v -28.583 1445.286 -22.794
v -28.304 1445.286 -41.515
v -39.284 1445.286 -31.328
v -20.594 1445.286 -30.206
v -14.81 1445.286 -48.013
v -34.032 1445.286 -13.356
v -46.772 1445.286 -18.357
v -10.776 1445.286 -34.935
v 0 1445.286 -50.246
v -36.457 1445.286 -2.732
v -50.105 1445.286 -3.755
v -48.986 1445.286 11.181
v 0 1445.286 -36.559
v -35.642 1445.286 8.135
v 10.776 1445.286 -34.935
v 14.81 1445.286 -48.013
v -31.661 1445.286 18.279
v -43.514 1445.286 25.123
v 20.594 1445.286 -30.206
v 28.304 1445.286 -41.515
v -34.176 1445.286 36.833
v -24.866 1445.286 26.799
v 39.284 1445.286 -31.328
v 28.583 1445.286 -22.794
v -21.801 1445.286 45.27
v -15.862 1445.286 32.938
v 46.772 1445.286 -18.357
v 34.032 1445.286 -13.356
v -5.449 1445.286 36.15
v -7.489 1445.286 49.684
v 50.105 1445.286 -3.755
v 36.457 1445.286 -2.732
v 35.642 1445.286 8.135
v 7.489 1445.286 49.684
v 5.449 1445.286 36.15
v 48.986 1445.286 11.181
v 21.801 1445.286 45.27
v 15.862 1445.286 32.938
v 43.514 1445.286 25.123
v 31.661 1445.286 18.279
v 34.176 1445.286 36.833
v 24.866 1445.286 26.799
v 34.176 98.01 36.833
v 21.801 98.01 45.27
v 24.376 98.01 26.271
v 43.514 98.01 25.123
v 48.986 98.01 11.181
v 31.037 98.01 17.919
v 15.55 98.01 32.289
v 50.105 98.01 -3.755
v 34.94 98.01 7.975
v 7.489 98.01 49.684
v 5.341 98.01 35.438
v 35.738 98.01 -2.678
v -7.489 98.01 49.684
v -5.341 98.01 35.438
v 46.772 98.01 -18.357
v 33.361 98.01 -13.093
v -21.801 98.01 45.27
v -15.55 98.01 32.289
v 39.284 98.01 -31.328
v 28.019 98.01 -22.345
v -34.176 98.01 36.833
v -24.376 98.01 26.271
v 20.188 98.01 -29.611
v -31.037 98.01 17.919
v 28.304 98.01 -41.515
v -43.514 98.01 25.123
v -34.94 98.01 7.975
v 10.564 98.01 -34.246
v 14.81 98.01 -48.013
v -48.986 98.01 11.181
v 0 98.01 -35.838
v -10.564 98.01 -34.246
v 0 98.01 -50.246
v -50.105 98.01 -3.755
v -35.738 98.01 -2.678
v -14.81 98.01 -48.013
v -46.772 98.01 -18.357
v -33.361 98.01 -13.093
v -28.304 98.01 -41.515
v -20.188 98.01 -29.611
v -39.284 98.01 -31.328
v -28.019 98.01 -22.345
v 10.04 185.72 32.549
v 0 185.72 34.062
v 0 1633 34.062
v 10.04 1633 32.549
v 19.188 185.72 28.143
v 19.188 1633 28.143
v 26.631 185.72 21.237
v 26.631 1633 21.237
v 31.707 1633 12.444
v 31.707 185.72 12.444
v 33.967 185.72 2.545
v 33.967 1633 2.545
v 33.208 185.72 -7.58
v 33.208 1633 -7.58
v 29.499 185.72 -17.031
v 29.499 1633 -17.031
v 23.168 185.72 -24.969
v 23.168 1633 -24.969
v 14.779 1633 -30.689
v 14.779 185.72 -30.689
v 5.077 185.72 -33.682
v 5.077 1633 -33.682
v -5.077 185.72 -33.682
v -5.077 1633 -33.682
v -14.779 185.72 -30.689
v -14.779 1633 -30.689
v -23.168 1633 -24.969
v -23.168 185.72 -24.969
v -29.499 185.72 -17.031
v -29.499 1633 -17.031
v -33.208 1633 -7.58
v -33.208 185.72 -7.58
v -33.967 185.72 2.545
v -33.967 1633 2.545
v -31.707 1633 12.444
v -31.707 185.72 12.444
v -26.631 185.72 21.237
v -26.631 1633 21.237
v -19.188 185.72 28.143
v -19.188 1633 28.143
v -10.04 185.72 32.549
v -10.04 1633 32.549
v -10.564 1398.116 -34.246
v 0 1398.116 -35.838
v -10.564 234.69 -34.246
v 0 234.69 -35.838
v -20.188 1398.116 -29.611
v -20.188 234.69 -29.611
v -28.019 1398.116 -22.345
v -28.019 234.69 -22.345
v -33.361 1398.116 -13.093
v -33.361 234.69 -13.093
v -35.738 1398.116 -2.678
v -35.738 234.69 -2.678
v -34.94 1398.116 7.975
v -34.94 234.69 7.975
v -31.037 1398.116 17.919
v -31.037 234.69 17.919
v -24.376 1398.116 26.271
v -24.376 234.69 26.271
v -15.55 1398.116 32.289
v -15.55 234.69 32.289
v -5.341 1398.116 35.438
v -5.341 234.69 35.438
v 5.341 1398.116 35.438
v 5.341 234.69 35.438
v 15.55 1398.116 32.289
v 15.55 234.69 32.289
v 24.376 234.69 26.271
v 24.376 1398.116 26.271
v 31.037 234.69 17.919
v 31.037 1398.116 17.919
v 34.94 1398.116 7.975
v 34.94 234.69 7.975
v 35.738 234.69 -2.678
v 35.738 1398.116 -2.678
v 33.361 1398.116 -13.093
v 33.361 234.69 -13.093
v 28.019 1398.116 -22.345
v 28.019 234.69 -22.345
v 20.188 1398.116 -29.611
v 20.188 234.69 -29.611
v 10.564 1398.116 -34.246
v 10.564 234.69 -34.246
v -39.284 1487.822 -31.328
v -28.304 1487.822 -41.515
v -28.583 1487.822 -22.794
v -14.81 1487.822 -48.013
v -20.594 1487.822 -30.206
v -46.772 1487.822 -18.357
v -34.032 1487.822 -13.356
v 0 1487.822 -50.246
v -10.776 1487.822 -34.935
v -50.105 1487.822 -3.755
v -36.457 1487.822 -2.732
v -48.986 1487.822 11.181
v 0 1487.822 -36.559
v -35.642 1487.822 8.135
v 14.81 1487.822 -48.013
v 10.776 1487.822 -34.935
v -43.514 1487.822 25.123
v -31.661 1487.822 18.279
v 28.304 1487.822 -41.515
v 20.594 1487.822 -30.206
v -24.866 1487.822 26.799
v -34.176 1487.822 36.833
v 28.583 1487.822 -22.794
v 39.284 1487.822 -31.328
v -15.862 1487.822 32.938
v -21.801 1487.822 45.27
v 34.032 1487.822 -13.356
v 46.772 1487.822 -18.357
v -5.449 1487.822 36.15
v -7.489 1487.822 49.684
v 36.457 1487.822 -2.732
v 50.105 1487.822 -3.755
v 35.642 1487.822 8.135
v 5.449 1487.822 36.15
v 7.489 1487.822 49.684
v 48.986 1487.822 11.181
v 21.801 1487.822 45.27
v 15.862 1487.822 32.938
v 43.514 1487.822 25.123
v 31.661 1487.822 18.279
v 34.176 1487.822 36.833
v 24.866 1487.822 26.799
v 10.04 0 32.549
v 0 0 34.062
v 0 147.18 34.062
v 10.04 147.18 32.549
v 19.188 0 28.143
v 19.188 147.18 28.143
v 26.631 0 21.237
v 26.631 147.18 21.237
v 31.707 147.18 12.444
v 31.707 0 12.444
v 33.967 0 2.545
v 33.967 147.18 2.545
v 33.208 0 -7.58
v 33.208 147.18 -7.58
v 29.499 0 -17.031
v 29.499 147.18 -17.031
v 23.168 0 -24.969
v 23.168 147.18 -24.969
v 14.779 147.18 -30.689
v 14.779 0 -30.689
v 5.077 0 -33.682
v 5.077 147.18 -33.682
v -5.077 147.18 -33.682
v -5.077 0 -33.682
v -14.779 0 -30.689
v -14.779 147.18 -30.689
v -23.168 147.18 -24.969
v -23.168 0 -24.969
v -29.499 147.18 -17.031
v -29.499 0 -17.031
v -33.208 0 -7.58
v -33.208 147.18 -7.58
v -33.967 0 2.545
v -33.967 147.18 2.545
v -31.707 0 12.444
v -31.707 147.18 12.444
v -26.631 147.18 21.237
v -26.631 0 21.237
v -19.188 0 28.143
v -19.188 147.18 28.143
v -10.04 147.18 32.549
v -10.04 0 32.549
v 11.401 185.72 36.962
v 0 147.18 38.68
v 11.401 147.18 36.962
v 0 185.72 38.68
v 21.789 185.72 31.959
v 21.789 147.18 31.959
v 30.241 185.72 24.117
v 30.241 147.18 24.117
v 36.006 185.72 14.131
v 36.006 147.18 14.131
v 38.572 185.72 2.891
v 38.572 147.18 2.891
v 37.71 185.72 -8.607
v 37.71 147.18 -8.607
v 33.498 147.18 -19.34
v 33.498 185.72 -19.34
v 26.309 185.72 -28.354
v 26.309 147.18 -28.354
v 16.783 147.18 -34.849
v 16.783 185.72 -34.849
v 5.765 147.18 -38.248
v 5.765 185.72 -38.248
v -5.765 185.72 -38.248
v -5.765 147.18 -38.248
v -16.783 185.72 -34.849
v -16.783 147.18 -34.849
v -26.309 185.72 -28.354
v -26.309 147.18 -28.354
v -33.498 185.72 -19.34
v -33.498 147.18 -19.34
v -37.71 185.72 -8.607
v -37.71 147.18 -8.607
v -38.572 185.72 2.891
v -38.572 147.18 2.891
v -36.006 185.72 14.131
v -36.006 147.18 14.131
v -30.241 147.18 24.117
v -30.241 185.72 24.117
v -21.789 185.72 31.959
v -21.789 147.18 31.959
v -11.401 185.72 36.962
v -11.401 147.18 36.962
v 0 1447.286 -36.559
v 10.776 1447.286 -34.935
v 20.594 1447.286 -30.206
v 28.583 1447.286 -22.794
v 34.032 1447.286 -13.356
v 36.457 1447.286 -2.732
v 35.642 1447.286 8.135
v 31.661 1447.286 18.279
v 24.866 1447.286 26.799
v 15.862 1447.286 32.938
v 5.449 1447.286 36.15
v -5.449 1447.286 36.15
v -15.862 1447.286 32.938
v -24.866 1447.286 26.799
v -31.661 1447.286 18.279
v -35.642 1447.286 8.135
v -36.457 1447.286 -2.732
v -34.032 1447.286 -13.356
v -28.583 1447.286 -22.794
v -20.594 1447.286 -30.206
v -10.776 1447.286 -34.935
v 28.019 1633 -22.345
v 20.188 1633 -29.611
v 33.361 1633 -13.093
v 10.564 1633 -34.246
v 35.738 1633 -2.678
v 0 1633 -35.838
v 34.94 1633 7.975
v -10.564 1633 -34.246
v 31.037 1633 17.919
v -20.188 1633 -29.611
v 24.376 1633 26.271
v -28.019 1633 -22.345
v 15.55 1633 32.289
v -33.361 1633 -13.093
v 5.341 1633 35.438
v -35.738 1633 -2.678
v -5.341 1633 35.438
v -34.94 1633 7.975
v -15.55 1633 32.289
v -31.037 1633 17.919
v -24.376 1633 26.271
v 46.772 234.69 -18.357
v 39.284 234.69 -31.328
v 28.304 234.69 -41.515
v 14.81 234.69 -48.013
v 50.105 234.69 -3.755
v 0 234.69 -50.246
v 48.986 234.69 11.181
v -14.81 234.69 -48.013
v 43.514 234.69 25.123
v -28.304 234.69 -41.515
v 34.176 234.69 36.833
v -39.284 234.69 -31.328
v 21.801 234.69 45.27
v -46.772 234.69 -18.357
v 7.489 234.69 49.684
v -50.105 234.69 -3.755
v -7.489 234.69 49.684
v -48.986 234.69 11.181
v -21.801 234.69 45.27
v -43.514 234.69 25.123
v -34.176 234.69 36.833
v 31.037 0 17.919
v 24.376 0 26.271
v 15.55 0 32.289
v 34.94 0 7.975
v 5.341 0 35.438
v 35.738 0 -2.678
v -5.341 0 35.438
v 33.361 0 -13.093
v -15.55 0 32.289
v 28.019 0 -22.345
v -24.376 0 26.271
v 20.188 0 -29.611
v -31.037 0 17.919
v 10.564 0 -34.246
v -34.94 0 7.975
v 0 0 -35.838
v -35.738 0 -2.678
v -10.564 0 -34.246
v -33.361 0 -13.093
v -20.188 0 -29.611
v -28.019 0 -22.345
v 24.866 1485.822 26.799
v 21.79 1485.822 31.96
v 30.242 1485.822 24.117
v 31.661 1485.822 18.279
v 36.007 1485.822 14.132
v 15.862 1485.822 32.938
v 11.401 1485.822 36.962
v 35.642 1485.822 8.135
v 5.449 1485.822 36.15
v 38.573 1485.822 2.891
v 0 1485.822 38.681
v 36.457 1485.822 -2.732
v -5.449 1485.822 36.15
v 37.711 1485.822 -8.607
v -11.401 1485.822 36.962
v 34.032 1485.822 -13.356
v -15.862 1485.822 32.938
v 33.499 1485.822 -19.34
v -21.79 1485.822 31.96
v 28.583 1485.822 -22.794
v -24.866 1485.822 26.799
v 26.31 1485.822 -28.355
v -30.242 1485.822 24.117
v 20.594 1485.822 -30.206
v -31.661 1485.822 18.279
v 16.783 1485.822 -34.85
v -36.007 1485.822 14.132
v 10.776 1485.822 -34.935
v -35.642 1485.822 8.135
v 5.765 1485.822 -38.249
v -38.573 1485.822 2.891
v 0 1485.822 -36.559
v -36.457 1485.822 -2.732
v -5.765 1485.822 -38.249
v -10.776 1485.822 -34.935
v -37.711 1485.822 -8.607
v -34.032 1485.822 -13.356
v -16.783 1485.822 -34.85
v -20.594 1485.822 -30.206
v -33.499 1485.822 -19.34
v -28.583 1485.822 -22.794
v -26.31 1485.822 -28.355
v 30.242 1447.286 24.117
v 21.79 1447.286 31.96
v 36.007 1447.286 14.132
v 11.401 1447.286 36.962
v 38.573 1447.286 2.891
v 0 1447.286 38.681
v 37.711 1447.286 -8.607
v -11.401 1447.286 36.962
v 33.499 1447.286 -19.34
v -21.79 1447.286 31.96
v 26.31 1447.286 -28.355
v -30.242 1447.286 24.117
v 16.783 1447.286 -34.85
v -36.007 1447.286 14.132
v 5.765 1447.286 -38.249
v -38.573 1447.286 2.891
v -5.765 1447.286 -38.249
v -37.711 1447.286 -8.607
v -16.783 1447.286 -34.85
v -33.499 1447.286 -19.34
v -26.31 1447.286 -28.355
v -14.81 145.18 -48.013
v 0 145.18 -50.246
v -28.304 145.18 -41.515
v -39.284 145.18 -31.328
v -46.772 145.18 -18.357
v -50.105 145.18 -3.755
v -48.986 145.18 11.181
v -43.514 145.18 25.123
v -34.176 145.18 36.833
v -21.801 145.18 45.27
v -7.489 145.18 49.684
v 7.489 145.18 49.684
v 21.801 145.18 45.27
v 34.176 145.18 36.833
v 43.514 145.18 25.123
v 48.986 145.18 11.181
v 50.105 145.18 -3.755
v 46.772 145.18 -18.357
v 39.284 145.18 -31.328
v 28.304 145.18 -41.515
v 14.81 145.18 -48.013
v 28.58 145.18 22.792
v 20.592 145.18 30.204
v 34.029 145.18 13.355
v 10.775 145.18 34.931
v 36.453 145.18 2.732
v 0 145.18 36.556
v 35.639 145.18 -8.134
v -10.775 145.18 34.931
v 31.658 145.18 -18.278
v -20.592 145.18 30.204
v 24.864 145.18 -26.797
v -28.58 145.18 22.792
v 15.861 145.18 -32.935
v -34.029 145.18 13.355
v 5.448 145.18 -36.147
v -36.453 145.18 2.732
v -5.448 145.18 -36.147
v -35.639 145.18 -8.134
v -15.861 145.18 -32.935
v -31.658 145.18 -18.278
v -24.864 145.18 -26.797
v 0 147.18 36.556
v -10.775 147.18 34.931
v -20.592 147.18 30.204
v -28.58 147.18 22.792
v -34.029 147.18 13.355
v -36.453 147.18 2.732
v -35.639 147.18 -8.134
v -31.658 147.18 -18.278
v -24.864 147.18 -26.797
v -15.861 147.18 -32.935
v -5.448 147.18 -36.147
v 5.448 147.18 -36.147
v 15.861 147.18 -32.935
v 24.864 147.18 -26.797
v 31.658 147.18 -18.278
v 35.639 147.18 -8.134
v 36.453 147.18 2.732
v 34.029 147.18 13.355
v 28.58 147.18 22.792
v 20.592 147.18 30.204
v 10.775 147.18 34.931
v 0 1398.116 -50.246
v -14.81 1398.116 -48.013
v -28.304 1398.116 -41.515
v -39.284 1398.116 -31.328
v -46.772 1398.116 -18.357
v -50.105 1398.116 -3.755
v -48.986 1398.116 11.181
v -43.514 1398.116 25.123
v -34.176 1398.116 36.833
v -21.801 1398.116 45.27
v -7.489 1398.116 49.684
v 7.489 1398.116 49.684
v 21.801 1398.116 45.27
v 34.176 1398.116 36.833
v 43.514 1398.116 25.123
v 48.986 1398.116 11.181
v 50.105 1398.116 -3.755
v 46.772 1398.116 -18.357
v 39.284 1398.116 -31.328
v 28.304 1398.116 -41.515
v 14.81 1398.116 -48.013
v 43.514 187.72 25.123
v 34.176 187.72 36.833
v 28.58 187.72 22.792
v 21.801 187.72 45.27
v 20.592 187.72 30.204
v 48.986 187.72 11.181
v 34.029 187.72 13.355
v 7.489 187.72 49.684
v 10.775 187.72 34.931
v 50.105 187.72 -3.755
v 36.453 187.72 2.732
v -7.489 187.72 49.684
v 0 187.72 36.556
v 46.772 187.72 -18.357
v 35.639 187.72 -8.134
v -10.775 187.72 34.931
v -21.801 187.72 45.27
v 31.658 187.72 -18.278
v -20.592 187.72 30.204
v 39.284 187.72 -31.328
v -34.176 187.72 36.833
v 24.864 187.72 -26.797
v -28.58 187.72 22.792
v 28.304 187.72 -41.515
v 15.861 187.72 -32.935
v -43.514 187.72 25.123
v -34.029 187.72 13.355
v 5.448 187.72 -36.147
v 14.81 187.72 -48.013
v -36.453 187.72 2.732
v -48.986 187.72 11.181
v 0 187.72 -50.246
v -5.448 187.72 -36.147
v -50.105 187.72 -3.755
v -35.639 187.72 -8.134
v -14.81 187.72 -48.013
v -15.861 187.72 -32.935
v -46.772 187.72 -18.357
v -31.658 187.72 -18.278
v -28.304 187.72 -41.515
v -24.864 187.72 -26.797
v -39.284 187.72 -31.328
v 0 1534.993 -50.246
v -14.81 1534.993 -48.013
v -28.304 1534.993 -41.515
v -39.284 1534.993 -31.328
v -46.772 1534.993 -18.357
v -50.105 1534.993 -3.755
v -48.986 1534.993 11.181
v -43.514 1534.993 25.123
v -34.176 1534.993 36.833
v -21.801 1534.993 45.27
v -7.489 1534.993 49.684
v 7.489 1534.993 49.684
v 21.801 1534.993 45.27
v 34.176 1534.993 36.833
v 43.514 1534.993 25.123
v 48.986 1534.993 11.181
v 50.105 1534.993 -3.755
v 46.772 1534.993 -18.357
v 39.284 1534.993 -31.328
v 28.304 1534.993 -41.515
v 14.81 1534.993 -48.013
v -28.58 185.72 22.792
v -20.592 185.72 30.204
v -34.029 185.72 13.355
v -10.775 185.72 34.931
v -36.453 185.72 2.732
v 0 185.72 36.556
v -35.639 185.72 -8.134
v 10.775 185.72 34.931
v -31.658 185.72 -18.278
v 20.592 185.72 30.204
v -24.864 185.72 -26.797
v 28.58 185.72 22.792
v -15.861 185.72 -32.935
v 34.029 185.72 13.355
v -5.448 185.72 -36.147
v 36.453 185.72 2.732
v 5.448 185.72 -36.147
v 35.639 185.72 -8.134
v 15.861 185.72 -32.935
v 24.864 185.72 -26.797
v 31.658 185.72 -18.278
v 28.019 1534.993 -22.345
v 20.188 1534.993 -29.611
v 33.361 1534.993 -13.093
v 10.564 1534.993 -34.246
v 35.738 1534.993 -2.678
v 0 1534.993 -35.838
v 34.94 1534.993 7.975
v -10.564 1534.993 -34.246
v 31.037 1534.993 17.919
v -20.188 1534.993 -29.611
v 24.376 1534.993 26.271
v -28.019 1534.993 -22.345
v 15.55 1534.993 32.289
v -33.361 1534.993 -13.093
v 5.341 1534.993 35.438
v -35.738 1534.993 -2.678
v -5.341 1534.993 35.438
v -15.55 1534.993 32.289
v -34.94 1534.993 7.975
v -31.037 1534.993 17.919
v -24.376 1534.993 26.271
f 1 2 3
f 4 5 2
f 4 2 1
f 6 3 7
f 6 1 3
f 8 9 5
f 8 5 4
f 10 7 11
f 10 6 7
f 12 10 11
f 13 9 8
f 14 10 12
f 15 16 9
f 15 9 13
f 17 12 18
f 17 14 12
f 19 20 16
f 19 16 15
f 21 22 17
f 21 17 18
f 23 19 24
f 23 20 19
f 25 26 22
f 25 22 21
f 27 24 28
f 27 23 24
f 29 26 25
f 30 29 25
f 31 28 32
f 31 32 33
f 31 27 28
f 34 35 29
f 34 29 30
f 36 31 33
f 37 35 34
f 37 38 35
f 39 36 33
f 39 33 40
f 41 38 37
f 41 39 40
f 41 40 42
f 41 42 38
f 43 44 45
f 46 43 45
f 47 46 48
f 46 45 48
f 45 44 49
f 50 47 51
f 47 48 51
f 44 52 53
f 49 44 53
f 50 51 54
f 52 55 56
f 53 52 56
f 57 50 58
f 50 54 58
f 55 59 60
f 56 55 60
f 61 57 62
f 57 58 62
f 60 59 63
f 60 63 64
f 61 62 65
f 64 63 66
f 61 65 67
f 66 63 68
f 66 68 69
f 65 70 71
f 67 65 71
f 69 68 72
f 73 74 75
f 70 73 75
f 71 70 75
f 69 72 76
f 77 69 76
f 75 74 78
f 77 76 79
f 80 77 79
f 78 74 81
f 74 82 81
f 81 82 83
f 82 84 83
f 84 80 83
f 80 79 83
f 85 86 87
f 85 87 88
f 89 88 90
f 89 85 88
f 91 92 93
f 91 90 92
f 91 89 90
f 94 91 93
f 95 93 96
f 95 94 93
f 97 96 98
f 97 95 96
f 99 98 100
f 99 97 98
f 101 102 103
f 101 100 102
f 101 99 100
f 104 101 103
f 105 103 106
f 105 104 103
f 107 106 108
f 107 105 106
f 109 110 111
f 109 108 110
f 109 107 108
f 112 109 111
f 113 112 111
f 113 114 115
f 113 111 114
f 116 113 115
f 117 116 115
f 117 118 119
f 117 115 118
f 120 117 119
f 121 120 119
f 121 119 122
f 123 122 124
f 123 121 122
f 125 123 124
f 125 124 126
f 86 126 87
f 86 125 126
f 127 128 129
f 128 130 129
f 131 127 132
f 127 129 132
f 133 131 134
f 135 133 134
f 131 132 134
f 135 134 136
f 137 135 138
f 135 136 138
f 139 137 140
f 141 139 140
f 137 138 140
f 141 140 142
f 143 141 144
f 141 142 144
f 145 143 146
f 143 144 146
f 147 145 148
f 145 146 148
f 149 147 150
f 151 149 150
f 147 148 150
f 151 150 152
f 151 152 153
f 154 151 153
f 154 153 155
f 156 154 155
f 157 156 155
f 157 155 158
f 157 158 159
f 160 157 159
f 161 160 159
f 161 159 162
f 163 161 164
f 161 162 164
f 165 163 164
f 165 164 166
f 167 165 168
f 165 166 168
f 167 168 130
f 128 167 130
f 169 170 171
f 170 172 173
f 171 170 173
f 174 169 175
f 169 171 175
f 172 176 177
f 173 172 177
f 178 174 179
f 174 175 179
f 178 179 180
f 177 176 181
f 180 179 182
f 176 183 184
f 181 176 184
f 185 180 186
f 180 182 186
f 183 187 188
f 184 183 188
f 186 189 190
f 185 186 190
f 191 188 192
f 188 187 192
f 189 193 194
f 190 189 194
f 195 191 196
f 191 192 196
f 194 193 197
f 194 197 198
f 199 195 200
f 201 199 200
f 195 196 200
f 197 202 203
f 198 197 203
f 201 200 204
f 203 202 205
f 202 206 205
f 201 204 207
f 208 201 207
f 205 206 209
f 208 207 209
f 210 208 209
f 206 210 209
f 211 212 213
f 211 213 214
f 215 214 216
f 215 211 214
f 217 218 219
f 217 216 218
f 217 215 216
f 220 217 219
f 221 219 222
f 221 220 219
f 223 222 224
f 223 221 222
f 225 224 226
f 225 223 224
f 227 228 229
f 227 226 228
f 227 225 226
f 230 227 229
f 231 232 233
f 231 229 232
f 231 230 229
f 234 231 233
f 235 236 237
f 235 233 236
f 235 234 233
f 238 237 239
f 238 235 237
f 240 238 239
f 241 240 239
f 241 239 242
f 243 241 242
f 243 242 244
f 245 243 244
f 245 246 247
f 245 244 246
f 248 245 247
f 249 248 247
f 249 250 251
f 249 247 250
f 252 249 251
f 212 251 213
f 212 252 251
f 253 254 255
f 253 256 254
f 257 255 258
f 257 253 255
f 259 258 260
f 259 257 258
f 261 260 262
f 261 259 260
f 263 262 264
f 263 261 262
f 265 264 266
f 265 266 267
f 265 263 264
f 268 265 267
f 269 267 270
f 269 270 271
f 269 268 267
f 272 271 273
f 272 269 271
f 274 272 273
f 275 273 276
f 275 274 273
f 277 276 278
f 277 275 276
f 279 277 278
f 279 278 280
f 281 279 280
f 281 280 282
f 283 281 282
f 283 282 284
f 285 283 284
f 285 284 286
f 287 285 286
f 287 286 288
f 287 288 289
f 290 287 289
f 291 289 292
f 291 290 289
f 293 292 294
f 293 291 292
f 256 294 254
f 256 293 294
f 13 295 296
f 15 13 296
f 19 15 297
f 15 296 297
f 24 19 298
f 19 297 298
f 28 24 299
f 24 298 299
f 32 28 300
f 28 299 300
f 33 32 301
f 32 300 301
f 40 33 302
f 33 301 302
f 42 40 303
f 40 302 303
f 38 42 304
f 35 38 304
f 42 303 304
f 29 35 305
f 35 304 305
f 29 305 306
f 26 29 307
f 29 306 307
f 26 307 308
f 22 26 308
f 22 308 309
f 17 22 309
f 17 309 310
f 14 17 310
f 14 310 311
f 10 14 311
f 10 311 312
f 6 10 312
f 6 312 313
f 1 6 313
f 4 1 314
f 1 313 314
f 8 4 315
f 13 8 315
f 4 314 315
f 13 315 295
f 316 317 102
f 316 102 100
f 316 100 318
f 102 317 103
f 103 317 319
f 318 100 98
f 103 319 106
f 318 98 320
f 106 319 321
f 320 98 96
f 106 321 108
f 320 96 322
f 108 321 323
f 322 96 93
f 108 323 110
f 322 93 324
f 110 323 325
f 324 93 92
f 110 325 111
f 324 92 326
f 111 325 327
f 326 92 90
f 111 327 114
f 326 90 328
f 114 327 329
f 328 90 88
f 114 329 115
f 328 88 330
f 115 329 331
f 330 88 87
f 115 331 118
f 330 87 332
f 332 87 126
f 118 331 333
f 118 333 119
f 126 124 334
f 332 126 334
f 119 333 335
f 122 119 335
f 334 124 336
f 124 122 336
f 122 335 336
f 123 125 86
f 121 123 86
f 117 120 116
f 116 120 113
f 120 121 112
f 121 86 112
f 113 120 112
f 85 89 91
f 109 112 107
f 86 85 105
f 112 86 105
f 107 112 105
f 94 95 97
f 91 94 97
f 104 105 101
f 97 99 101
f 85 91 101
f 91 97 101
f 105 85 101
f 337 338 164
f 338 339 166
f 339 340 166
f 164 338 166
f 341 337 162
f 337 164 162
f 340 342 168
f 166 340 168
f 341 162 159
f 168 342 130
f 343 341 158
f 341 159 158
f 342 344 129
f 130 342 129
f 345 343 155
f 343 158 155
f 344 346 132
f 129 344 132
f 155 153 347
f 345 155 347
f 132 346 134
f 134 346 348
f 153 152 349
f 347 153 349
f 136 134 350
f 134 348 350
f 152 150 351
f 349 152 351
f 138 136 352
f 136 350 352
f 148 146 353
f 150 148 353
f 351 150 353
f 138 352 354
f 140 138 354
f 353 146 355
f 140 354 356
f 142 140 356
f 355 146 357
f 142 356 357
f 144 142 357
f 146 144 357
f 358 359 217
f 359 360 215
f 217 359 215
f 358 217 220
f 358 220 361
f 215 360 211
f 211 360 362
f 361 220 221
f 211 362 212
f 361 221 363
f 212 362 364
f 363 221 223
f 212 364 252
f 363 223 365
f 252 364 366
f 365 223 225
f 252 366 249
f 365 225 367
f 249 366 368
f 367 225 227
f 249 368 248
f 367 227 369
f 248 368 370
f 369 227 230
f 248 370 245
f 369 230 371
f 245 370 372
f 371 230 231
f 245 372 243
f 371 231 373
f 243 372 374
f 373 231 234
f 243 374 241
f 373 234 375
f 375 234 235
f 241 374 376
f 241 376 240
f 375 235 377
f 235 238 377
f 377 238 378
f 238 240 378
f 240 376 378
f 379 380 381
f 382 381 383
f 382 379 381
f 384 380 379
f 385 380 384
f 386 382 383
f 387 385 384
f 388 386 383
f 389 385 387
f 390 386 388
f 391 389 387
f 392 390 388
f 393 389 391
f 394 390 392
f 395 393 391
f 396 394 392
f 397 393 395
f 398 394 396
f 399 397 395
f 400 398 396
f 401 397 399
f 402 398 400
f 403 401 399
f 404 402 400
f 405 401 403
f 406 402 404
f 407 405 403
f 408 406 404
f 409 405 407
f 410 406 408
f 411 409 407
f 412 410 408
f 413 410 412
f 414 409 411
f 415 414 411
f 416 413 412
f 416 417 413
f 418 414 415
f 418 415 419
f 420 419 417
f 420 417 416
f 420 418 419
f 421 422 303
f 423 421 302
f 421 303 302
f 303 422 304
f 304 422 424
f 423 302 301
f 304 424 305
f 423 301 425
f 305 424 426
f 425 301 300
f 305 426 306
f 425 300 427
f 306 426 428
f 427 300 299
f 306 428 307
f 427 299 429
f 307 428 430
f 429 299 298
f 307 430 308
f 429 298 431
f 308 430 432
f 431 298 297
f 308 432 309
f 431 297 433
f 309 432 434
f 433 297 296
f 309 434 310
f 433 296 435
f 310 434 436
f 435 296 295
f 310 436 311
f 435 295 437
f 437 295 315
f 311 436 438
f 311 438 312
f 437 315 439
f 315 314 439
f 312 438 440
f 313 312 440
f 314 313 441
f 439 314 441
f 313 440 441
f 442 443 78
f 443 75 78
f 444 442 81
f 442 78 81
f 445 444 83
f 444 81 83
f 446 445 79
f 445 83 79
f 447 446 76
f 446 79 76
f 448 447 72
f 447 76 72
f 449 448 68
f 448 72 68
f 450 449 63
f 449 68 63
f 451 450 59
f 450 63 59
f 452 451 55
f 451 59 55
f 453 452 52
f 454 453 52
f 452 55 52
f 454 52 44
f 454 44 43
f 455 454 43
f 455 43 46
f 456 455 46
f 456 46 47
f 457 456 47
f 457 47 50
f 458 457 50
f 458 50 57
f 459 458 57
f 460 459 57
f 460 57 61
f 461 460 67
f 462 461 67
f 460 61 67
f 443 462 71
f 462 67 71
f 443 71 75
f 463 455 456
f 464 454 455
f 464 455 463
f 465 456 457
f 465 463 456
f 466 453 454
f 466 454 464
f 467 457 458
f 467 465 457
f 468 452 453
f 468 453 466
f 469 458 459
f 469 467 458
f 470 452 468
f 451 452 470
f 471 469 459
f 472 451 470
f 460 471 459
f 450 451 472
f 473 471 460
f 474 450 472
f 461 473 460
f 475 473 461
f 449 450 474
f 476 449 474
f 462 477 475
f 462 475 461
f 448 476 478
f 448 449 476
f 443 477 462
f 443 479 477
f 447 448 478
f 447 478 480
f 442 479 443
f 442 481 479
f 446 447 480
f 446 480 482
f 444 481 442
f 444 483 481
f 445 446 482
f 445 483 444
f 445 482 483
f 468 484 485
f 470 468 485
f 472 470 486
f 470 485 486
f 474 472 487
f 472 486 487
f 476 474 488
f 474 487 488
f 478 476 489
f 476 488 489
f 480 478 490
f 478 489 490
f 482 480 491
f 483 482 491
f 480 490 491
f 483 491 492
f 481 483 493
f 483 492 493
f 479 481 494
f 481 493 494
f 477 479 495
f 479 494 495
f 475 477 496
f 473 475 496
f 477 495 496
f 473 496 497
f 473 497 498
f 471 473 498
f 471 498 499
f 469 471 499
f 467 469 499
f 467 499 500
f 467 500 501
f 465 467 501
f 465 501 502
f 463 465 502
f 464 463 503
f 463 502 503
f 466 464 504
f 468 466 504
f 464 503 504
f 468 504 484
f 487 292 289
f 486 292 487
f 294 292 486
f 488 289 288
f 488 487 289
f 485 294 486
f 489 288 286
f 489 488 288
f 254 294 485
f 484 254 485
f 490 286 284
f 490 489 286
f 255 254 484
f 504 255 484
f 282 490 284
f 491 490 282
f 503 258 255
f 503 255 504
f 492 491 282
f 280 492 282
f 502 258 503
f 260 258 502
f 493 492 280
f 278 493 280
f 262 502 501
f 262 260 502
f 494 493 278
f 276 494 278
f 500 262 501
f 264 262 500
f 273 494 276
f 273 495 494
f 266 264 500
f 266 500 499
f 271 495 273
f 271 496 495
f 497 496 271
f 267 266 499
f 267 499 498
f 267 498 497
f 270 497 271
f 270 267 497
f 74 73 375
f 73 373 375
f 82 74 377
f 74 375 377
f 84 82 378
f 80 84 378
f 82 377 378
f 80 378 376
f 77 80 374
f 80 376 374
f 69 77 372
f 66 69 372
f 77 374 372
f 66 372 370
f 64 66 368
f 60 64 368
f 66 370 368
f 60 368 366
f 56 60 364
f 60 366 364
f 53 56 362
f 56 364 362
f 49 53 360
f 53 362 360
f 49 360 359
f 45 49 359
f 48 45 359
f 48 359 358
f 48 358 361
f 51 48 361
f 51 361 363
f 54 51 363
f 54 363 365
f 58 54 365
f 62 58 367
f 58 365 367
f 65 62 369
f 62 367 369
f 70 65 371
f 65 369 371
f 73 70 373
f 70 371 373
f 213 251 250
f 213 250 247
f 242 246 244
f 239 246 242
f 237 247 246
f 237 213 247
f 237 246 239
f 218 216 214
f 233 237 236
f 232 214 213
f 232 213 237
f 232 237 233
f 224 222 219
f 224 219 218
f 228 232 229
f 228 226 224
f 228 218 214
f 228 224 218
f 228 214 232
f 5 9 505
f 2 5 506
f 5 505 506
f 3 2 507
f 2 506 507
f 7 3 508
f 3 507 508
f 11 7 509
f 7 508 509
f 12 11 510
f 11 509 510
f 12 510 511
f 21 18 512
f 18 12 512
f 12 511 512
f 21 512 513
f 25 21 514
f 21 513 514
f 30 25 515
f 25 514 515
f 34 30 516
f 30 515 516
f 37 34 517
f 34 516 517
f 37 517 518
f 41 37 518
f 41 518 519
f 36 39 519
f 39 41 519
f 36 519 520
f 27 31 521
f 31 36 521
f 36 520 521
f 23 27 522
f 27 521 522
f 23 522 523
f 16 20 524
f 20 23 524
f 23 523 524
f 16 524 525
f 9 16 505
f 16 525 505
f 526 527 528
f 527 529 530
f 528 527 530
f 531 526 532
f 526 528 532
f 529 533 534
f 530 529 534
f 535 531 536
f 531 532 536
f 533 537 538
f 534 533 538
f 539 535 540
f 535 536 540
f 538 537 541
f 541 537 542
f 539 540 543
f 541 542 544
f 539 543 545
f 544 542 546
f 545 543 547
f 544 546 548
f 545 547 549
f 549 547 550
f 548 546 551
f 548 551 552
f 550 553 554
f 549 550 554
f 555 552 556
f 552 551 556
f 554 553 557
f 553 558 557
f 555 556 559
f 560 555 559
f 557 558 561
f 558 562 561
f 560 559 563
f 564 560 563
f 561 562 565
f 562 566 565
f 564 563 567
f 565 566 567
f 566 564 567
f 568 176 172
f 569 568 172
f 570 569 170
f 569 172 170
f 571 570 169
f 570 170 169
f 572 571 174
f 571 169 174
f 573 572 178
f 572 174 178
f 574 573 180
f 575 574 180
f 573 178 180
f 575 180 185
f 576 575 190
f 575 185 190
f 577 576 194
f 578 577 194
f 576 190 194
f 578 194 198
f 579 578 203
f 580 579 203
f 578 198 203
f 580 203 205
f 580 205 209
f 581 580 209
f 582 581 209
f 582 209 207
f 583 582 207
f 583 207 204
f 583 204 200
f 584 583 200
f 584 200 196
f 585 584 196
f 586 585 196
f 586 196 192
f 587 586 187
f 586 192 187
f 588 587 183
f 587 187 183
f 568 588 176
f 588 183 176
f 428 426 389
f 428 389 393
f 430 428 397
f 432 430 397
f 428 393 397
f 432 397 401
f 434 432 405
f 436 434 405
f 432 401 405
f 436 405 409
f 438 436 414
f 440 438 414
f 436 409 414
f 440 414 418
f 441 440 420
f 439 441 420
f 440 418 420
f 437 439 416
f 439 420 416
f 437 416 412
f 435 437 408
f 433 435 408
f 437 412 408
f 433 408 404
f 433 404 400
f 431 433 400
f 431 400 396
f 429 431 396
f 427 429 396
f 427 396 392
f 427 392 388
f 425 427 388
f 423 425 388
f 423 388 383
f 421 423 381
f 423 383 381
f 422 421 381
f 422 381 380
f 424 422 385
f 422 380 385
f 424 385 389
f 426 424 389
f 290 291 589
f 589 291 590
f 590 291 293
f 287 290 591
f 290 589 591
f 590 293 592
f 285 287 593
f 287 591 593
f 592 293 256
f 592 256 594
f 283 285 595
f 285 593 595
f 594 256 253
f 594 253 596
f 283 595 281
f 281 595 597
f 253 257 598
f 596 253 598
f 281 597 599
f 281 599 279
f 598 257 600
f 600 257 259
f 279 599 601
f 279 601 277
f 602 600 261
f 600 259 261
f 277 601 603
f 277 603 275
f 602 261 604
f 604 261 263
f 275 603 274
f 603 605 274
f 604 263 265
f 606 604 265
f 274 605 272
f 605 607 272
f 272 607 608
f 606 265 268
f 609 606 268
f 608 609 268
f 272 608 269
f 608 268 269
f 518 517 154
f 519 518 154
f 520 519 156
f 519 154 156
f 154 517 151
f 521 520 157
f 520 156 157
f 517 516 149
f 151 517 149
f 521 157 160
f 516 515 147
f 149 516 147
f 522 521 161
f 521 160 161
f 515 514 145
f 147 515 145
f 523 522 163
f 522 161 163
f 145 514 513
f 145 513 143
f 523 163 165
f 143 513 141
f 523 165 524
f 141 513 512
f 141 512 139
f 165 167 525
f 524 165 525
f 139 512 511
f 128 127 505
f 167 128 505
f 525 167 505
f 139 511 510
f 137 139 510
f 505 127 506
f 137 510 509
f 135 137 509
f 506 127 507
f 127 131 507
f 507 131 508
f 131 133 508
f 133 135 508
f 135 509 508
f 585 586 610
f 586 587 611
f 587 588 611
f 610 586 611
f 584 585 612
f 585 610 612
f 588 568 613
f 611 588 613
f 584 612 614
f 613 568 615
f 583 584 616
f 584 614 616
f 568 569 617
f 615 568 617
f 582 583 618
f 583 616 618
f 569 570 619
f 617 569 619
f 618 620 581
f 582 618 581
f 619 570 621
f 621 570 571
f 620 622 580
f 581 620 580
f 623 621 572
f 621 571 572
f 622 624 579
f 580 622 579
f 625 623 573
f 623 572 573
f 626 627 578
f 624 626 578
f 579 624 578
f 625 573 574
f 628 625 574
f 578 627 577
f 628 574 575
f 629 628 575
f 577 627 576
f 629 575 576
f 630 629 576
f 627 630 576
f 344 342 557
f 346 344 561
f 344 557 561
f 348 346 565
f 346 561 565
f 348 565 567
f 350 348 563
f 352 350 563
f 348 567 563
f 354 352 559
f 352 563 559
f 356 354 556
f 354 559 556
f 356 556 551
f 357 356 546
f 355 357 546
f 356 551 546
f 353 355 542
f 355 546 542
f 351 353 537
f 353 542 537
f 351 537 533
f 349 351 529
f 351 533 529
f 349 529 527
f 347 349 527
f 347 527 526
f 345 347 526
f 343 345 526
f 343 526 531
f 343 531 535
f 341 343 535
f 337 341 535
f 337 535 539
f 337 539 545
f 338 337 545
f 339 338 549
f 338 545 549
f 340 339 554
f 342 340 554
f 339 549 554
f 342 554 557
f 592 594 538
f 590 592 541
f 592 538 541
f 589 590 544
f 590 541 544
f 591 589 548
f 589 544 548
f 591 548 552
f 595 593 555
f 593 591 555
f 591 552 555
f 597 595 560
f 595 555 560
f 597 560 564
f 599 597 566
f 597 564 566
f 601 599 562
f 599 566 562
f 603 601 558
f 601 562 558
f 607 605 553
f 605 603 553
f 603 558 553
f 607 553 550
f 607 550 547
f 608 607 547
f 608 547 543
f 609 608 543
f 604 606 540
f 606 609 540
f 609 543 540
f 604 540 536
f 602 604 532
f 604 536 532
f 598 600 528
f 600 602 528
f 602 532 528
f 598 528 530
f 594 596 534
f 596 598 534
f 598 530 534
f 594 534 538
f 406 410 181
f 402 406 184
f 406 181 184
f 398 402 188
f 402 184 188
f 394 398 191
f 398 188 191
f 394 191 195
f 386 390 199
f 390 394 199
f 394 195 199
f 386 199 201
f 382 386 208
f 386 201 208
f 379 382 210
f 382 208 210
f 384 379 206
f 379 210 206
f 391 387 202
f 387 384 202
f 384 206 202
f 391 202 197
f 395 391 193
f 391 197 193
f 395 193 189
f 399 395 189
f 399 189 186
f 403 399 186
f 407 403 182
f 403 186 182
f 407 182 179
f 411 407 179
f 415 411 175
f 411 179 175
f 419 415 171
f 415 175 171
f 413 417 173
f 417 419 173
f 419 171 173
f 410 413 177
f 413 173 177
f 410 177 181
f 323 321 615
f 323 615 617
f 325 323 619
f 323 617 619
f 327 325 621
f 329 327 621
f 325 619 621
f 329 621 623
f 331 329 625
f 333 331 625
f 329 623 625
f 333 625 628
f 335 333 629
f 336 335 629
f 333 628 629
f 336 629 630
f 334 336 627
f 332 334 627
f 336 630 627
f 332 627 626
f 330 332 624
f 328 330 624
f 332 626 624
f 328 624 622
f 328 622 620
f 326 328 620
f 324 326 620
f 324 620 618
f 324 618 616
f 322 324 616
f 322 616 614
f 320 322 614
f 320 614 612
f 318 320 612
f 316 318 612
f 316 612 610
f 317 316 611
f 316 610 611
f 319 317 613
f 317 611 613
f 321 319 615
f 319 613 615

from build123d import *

# Parameters (mm, degrees)
ESBO_O3_W                  = 13.686755529
ESBO_O3_H                  = 42.535935493
ESBO_O4_W                  = 38.680905152
ESBO_O4_H                  = 38.535935493
CORTE_EXTRUS_O1_DEPTH      = 1635.545265364
CORTE_EXTRUS_O1_DEPTH_BACK = 1635.545265364
ESBO_O6_R                  = 34.061990031
ESBO_O7_W                  = 13.69
ESBO_O7_H                  = 42.54
ESBO_O8_W                  = 38.68
ESBO_O8_H                  = 38.54


with BuildPart() as part:
    # Esboço1 → Revolução6 (revolve)
    with BuildSketch(Plane.XY, mode=Mode.PRIVATE) as revolu_o6_sk:
        Polygon((0, 1633), (-35.838224288, 1633), (-35.838224288, 1534.993249603), (-50.245519822, 1534.993249603), (-50.245519822, 1398.116209781), (-35.838224288, 1398.116209781), (-35.838224288, 234.69), (-50.245519822, 234.69), (-50.245519822, 98.01), (-35.838224288, 98.01), (-35.838224288, 0), (0, 0), align=None)
    revolve(revolu_o6_sk.sketch.rotate(Axis((0, 0, 0), (0, 1, 0)), 270), axis=Axis((0, 0, 0), (0, 1, 0)))

    # Esboço3 → Corte-Revolução2 (revolve, cut)
    with BuildSketch(Plane(origin=(0, 0, 0), x_dir=(0, 0, -1), z_dir=(1, 0, 0))):
        with Locations((43.402142058, 1466.554177528)):
            Rectangle(ESBO_O3_W, ESBO_O3_H)
    revolve(axis=Axis((0, 1534.993249603, 0), (0, -1, 0)), mode=Mode.SUBTRACT)

    # Esboço4 → Revolução7 (revolve)
    with BuildSketch(Plane(origin=(0, 0, 0), x_dir=(0, 0, -1), z_dir=(1, 0, 0)), mode=Mode.PRIVATE) as revolu_o7_sk:
        with Locations((19.340452576, 1466.554177528)):
            Rectangle(ESBO_O4_W, ESBO_O4_H)
    revolve(revolu_o7_sk.sketch.rotate(Axis((0, 1487.822145274, 0), (0, -1, 0)), 180), axis=Axis((0, 1487.822145274, 0), (0, -1, 0)))

    # Esboço6 → Corte-extrusão1 (cut, two sides: drawn at the far end of the back side and taken through both)
    with BuildSketch(Plane(origin=(0, 1633, 0), x_dir=(1, 0, 0), z_dir=(0, 1, 0)).offset(-CORTE_EXTRUS_O1_DEPTH_BACK)):
        with Locations(Location((0, 0, 0), (0, 0, 270))):
            Circle(ESBO_O6_R)
    extrude(amount=CORTE_EXTRUS_O1_DEPTH + CORTE_EXTRUS_O1_DEPTH_BACK, mode=Mode.SUBTRACT)

    # Esboço7 → Corte-Revolução3 (revolve, cut)
    with BuildSketch(Plane(origin=(0, 0, 0), x_dir=(0, 0, -1), z_dir=(1, 0, 0)), mode=Mode.PRIVATE) as corte_revolu_o3_sk:
        with Locations((43.400519822, 166.45)):
            Rectangle(ESBO_O7_W, ESBO_O7_H)
    revolve(corte_revolu_o3_sk.sketch.rotate(Axis((0, 234.69, 0), (0, -1, 0)), 180), axis=Axis((0, 234.69, 0), (0, -1, 0)), mode=Mode.SUBTRACT)

    # Esboço8 → Revolução8 (revolve)
    with BuildSketch(Plane.XY, mode=Mode.PRIVATE) as revolu_o8_sk:
        with Locations((19.34, 166.45)):
            Rectangle(ESBO_O8_W, ESBO_O8_H)
    revolve(revolu_o8_sk.sketch.rotate(Axis((0, 145.18, 0), (0, 1, 0)), 270), axis=Axis((0, 145.18, 0), (0, 1, 0)))


solid = part.part
